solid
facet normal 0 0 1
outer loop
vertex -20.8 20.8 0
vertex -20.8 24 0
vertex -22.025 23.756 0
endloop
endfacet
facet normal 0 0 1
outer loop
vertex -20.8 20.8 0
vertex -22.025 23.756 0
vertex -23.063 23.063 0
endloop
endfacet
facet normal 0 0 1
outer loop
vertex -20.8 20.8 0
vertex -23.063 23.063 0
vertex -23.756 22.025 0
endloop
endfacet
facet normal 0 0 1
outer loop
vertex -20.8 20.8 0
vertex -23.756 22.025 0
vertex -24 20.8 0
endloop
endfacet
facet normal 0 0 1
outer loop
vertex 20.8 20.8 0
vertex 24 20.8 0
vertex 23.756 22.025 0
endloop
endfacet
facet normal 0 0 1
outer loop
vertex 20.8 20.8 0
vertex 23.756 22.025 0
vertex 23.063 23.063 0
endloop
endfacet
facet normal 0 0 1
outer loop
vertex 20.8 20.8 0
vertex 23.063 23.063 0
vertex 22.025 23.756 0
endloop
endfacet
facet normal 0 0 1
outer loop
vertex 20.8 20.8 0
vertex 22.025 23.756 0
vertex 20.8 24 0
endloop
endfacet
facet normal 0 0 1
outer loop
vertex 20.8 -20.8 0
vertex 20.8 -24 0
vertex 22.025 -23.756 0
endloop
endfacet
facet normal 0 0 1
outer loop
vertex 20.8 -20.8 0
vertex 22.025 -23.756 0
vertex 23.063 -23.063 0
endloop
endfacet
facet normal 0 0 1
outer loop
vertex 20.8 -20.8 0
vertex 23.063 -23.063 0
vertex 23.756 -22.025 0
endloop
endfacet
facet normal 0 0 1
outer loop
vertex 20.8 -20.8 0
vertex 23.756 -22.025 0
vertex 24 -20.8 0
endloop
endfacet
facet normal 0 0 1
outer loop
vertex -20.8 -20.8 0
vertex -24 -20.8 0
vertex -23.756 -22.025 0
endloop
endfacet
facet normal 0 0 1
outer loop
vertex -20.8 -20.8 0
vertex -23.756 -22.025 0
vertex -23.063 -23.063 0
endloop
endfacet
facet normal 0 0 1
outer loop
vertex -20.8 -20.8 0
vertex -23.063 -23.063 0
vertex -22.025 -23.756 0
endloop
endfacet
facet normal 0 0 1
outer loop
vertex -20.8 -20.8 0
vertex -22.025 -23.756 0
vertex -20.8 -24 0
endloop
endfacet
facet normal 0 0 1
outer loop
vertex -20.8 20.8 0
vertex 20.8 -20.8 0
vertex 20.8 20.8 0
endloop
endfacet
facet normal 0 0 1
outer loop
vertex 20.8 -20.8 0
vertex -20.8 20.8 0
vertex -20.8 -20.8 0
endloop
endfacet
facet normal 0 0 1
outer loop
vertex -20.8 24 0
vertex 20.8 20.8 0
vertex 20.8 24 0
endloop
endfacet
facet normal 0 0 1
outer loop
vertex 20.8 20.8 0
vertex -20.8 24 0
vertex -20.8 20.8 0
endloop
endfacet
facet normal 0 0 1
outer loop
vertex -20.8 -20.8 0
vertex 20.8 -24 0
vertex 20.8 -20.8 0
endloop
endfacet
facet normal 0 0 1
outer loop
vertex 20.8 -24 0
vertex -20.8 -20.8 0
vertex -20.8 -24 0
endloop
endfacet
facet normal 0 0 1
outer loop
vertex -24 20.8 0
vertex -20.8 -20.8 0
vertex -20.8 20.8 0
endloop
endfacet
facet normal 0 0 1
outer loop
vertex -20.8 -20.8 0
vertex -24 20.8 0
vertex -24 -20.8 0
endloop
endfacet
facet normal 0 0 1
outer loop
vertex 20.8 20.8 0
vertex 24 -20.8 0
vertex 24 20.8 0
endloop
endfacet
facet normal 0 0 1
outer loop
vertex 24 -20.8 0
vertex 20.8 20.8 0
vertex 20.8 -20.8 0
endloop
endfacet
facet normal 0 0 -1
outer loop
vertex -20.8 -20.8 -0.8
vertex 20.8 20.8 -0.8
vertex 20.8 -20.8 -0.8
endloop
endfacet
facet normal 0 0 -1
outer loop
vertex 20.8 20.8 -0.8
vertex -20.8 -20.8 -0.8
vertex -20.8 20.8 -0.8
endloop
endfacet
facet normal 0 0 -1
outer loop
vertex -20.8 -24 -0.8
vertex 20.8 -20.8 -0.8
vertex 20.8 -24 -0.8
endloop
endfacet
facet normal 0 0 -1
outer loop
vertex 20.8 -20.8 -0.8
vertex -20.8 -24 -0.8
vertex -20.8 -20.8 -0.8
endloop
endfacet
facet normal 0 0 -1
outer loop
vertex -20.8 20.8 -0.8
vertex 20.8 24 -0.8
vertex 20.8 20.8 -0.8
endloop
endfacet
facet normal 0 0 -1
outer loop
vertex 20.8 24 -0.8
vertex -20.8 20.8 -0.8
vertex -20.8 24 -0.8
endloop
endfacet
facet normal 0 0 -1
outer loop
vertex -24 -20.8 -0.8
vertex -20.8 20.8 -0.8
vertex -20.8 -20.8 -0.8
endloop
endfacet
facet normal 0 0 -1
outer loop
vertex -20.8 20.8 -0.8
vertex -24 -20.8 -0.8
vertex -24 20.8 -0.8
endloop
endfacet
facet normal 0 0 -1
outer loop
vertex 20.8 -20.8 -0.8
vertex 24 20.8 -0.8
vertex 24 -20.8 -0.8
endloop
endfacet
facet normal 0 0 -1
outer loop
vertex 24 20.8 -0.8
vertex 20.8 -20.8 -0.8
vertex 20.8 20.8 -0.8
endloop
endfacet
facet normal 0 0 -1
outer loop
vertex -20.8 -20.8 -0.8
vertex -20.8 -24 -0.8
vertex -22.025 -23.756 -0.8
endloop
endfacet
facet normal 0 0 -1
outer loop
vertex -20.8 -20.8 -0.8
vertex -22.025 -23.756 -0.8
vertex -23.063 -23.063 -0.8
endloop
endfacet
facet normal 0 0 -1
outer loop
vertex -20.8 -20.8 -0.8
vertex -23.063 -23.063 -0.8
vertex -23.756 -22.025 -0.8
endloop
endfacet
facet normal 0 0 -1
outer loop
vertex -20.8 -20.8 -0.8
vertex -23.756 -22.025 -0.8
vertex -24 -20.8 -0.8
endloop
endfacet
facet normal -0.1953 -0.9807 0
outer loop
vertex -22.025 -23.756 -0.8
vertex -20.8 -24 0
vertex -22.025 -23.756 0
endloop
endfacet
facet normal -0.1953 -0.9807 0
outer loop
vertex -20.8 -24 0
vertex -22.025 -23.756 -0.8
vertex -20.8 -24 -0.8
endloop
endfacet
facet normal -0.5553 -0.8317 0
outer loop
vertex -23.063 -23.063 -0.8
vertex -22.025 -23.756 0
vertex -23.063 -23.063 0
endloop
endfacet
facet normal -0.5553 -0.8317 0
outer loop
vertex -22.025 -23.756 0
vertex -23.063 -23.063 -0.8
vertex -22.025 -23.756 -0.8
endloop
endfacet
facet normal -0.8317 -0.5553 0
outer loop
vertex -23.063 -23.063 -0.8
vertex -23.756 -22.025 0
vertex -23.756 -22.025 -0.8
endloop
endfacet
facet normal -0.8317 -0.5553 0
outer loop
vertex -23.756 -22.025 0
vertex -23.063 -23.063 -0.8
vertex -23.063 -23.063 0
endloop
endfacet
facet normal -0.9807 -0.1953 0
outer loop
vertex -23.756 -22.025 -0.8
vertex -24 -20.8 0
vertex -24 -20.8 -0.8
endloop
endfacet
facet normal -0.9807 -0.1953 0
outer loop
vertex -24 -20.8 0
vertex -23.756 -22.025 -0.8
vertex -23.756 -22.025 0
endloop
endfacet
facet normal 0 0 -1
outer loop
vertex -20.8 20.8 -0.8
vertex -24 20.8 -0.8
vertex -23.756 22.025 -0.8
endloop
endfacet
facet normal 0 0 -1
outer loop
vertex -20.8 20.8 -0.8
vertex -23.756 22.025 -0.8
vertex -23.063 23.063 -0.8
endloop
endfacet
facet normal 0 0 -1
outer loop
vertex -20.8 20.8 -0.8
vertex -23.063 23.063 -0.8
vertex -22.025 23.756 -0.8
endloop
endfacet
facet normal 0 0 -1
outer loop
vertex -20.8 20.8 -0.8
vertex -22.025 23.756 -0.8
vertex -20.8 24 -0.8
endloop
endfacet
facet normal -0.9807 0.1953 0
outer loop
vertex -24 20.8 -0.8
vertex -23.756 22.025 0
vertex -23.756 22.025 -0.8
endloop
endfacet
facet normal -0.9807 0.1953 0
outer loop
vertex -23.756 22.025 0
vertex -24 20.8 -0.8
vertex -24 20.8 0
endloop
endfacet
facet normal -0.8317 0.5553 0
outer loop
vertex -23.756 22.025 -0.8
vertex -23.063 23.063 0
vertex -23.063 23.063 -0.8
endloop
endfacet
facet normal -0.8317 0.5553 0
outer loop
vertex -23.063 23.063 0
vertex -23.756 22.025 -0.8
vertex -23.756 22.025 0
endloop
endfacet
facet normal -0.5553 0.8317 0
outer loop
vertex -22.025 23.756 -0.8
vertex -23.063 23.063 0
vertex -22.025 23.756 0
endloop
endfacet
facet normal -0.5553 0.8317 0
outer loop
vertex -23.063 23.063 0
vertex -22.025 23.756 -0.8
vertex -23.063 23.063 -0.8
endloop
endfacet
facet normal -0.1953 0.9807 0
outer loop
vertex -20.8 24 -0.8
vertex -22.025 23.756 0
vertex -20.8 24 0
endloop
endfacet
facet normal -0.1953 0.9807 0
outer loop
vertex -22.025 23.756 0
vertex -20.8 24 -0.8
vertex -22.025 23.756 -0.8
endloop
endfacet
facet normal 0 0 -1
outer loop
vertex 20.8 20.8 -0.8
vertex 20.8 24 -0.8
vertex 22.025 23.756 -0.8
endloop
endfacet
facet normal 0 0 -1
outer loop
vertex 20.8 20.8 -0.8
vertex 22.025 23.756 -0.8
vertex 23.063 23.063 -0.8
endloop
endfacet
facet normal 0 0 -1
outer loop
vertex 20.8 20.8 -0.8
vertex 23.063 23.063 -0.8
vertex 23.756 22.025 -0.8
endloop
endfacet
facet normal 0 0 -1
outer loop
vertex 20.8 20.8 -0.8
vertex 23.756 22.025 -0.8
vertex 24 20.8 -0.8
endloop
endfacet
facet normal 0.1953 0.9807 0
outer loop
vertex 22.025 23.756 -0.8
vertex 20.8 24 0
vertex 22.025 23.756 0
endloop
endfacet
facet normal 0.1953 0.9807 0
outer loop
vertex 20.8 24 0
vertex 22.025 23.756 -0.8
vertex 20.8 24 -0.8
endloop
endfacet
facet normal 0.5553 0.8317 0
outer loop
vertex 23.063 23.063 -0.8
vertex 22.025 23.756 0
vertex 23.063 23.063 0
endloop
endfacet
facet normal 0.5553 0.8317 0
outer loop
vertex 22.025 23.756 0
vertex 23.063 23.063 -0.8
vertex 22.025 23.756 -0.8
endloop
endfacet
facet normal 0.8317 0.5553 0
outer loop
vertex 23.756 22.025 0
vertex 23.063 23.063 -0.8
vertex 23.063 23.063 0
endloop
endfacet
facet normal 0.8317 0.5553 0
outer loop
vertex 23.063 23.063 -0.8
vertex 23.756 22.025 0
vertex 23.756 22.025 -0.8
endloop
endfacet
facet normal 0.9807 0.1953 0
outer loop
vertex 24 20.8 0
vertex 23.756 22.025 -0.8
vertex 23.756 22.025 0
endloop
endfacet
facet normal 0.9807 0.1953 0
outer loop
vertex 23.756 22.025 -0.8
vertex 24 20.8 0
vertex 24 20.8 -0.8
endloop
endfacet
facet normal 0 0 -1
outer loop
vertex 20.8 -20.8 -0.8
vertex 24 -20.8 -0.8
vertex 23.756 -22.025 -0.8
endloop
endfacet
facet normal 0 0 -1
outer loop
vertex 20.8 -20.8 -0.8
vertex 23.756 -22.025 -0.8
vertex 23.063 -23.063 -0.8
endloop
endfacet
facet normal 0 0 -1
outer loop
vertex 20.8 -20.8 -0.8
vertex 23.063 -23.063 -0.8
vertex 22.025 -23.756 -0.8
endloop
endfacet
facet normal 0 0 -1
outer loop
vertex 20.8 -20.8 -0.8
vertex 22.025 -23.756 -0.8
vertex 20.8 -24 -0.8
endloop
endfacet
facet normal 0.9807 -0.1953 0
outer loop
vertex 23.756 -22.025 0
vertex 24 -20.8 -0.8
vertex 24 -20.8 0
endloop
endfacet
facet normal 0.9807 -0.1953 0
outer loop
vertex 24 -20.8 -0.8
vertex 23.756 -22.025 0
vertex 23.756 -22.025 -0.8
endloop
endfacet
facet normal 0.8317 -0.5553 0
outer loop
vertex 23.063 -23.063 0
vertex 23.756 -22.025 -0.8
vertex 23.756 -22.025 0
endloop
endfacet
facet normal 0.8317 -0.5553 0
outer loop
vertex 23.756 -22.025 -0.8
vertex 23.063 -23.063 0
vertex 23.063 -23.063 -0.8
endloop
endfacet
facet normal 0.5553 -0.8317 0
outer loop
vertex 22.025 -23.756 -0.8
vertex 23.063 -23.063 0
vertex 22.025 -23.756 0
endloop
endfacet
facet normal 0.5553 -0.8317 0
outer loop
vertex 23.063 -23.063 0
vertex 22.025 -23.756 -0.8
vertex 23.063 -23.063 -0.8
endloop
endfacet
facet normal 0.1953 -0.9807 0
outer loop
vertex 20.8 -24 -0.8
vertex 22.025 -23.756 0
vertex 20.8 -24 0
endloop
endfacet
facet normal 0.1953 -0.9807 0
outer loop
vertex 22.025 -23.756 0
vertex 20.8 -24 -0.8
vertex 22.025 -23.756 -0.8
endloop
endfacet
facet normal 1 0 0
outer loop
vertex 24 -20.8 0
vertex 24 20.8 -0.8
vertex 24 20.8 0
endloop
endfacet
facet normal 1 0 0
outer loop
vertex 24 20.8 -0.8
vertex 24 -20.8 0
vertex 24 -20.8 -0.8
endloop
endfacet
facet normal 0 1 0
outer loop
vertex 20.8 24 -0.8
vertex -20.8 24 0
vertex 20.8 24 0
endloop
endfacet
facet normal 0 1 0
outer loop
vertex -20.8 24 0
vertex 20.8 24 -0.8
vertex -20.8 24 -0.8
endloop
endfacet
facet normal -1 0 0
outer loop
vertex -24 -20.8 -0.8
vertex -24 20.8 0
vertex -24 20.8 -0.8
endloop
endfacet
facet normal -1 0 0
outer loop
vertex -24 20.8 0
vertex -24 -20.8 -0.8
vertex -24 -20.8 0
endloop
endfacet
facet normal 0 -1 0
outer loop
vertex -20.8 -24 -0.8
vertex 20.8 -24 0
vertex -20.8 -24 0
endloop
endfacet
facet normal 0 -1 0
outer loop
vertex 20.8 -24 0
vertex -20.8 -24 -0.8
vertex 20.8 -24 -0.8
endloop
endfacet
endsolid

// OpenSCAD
// file: ../p/1-4edge.scad
use <../lib.scad>
function ldraw_lib__1_4edge() = [
// 0 Circle 0.25
// 0 Name: 1-4edge.dat
// 0 Author: James Jessiman
// 0 !LDRAW_ORG Primitive UPDATE 2017-01
// 0 !LICENSE Licensed under CC BY 4.0 : see CAreadme.txt
// 
// 0 BFC CERTIFY CCW
  [0,"BFC","CERTIFY"],
  [0,"BFC","CCW"],
// 
// 0 !HISTORY 2007-06-22 [PTadmin] Header formatted for Contributor Agreement
// 0 !HISTORY 2008-07-01 [PTadmin] Official Update 2008-01
// 0 !HISTORY 2017-01-15 [Steffen] BFCed
// 0 !HISTORY 2017-12-30 [PTadmin] Official Update 2017-01
// 
// 
// 2 24 1 0 0 0.9239 0 0.3827
  [2,24,1,0,0,0.9239,0,0.3827],
// 2 24 0.9239 0 0.3827 0.7071 0 0.7071
  [2,24,0.9239,0,0.3827,0.7071,0,0.7071],
// 2 24 0.7071 0 0.7071 0.3827 0 0.9239
  [2,24,0.7071,0,0.7071,0.3827,0,0.9239],
// 2 24 0.3827 0 0.9239 0 0 1
  [2,24,0.3827,0,0.9239,0,0,1],
];
module ldraw_lib__1_4edge(step=0, col=false, unit=2/5, alt=false, line=0.2, solid=!$preview)
    makepoly(ldraw_lib__1_4edge(), step=step, col=col, unit=unit, alt=alt, line=line, solid=solid);
ldraw_lib__1_4edge(line=0.2);
// file: ../p/1-4cyli.scad
use <../lib.scad>
function ldraw_lib__1_4cyli() = [
// 0 Cylinder 0.25
// 0 Name: 1-4cyli.dat
// 0 Author: James Jessiman
// 0 !LDRAW_ORG Primitive UPDATE 2012-01
// 0 !LICENSE Licensed under CC BY 4.0 : see CAreadme.txt
// 
// 0 BFC CERTIFY CCW
  [0,"BFC","CERTIFY"],
  [0,"BFC","CCW"],
// 
// 0 !HISTORY 2002-03-23 [sbliss] Added BFC statement.
// 0 !HISTORY 2002-04-25 [PTadmin] Official Update 2002-02
// 0 !HISTORY 2007-06-22 [PTadmin] Header formatted for Contributor Agreement
// 0 !HISTORY 2008-07-01 [PTadmin] Official Update 2008-01
// 0 !HISTORY 2012-02-16 [Philo] Changed to CCW
// 0 !HISTORY 2012-03-30 [PTadmin] Official Update 2012-01
// 
// 
// 4 16 1 1 0 0.9239 1 0.3827 0.9239 0 0.3827 1 0 0
  [4,16,1,1,0,0.9239,1,0.3827,0.9239,0,0.3827,1,0,0],
// 5 24 1 0 0 1 1 0 0.9239 0 0.3827 1 0 -1
  [5,24,1,0,0,1,1,0,0.9239,0,0.3827,1,0,-1],
// 4 16 0.9239 1 0.3827 0.7071 1 0.7071 0.7071 0 0.7071 0.9239 0 0.3827
  [4,16,0.9239,1,0.3827,0.7071,1,0.7071,0.7071,0,0.7071,0.9239,0,0.3827],
// 5 24 0.9239 0 0.3827 0.9239 1 0.3827 0.7071 0 0.7071 1 0 0
  [5,24,0.9239,0,0.3827,0.9239,1,0.3827,0.7071,0,0.7071,1,0,0],
// 4 16 0.7071 1 0.7071 0.3827 1 0.9239 0.3827 0 0.9239 0.7071 0 0.7071
  [4,16,0.7071,1,0.7071,0.3827,1,0.9239,0.3827,0,0.9239,0.7071,0,0.7071],
// 5 24 0.7071 0 0.7071 0.7071 1 0.7071 0.3827 0 0.9239 0.9239 0 0.3827
  [5,24,0.7071,0,0.7071,0.7071,1,0.7071,0.3827,0,0.9239,0.9239,0,0.3827],
// 4 16 0.3827 1 0.9239 0 1 1 0 0 1 0.3827 0 0.9239
  [4,16,0.3827,1,0.9239,0,1,1,0,0,1,0.3827,0,0.9239],
// 5 24 0.3827 0 0.9239 0.3827 1 0.9239 0 0 1 0.7071 0 0.7071
  [5,24,0.3827,0,0.9239,0.3827,1,0.9239,0,0,1,0.7071,0,0.7071],
// 5 24 0 0 1 0 1 1 0.3827 0 0.9239 -1 0 1
  [5,24,0,0,1,0,1,1,0.3827,0,0.9239,-1,0,1],
];
module ldraw_lib__1_4cyli(step=0, col=false, unit=2/5, alt=false, line=0.2, solid=!$preview)
    makepoly(ldraw_lib__1_4cyli(), step=step, col=col, unit=unit, alt=alt, line=line, solid=solid);
ldraw_lib__1_4cyli(line=0.2);
// file: ../p/1-4disc.scad
use <../lib.scad>
function ldraw_lib__1_4disc() = [
// 0 Disc 0.25
// 0 Name: 1-4disc.dat
// 0 Author: James Jessiman
// 0 !LDRAW_ORG Primitive UPDATE 2002-02
// 0 !LICENSE Licensed under CC BY 4.0 : see CAreadme.txt
// 
// 0 BFC CERTIFY CCW
  [0,"BFC","CERTIFY"],
  [0,"BFC","CCW"],
// 
// 0 !HISTORY 2002-03-23 [sbliss] Added BFC statement.
// 0 !HISTORY 2002-04-25 [PTadmin] Official Update 2002-02
// 0 !HISTORY 2007-06-22 [PTadmin] Header formatted for Contributor Agreement
// 0 !HISTORY 2008-07-01 [PTadmin] Official Update 2008-01
// 
// 
// 3 16 0 0 0 1 0 0 0.9239 0 0.3827
  [3,16,0,0,0,1,0,0,0.9239,0,0.3827],
// 3 16 0 0 0 0.9239 0 0.3827 0.7071 0 0.7071
  [3,16,0,0,0,0.9239,0,0.3827,0.7071,0,0.7071],
// 3 16 0 0 0 0.7071 0 0.7071 0.3827 0 0.9239
  [3,16,0,0,0,0.7071,0,0.7071,0.3827,0,0.9239],
// 3 16 0 0 0 0.3827 0 0.9239 0 0 1
  [3,16,0,0,0,0.3827,0,0.9239,0,0,1],
// 0
];
module ldraw_lib__1_4disc(step=0, col=false, unit=2/5, alt=false, line=0.2, solid=!$preview)
    makepoly(ldraw_lib__1_4disc(), step=step, col=col, unit=unit, alt=alt, line=line, solid=solid);
ldraw_lib__1_4disc(line=0.2);
// file: ../p/1-4cylc.scad
use <../lib.scad>
use <1-4cyli.scad>
use <1-4disc.scad>
use <1-4edge.scad>
function ldraw_lib__1_4cylc() = [
// 0 Cylinder Closed 0.25
// 0 Name: 1-4cylc.dat
// 0 Author: Mark Kennedy [mkennedy]
// 0 !LDRAW_ORG Primitive UPDATE 2010-01
// 0 !LICENSE Licensed under CC BY 4.0 : see CAreadme.txt
// 
// 0 BFC CERTIFY CCW
  [0,"BFC","CERTIFY"],
  [0,"BFC","CCW"],
// 
// 0 !HISTORY 2010-04-05 [PTadmin] Official Update 2010-01
// 
// 
// 1 16 0 0 0 1 0 0 0 1 0 0 0 1 1-4edge.dat
  [1,16,0,0,0,1,0,0,0,1,0,0,0,1, ldraw_lib__1_4edge()],
// 1 16 0 1 0 1 0 0 0 1 0 0 0 1 1-4edge.dat
  [1,16,0,1,0,1,0,0,0,1,0,0,0,1, ldraw_lib__1_4edge()],
// 1 16 0 0 0 1 0 0 0 1 0 0 0 1 1-4disc.dat
  [1,16,0,0,0,1,0,0,0,1,0,0,0,1, ldraw_lib__1_4disc()],
// 1 16 0 0 0 1 0 0 0 1 0 0 0 1 1-4cyli.dat
  [1,16,0,0,0,1,0,0,0,1,0,0,0,1, ldraw_lib__1_4cyli()],
// 0
];
module ldraw_lib__1_4cylc(step=0, col=false, unit=2/5, alt=false, line=0.2, solid=!$preview)
    makepoly(ldraw_lib__1_4cylc(), step=step, col=col, unit=unit, alt=alt, line=line, solid=solid);
ldraw_lib__1_4cylc(line=0.2);
// main file
use <../lib.scad>
use <../p/1-4cylc.scad>
use <../p/1-4disc.scad>
function ldraw_lib__191765() = [
// 0 Cardboard  6 x  6 Thick with Rounded Corners with Silver Top
// 0 Name: 191765.dat
// 0 Author: Steffen [Steffen]
// 0 !LDRAW_ORG Part UPDATE 2020-02
// 0 !LICENSE Licensed under CC BY 4.0 : see CAreadme.txt
// 
// 0 !HELP For Plate 8 x 8 with Grille
// 
// 0 BFC CERTIFY CCW
  [0,"BFC","CERTIFY"],
  [0,"BFC","CCW"],
// 
// 0 !CATEGORY Sheet Cardboard
// 0 !KEYWORDS Scala, set 4336
// 
// 0 !HISTORY 2019-09-09 [PTadmin] Official Update 2019-02
// 0 !HISTORY 2020-07-06 [Steffen] adjusted title and !HELP
// 0 !HISTORY 2020-07-08 [PTadmin] Renamed from u9252p01
// 0 !HISTORY 2020-09-05 [PTadmin] Official Update 2020-02
// 
// 
// 1 383 -52 0 52 0 0 -8 0 1 0 8 0 0 1-4disc.dat
  [1,383,-52,0,52,0,0,-8,0,1,0,8,0,0, ldraw_lib__1_4disc()],
// 1 383 52 0 52 8 0 0 0 1 0 0 0 8 1-4disc.dat
  [1,383,52,0,52,8,0,0,0,1,0,0,0,8, ldraw_lib__1_4disc()],
// 1 383 52 0 -52 0 0 8 0 1 0 -8 0 0 1-4disc.dat
  [1,383,52,0,-52,0,0,8,0,1,0,-8,0,0, ldraw_lib__1_4disc()],
// 1 383 -52 0 -52 -8 0 0 0 1 0 0 0 -8 1-4disc.dat
  [1,383,-52,0,-52,-8,0,0,0,1,0,0,0,-8, ldraw_lib__1_4disc()],
// 4 383 -52 0 -52 52 0 -52 52 0 52 -52 0 52
  [4,383,-52,0,-52,52,0,-52,52,0,52,-52,0,52],
// 4 383 -52 0 52 52 0 52 52 0 60 -52 0 60
  [4,383,-52,0,52,52,0,52,52,0,60,-52,0,60],
// 4 383 -52 0 -60 52 0 -60 52 0 -52 -52 0 -52
  [4,383,-52,0,-60,52,0,-60,52,0,-52,-52,0,-52],
// 4 383 -52 0 -52 -52 0 52 -60 0 52 -60 0 -52
  [4,383,-52,0,-52,-52,0,52,-60,0,52,-60,0,-52],
// 4 383 60 0 -52 60 0 52 52 0 52 52 0 -52
  [4,383,60,0,-52,60,0,52,52,0,52,52,0,-52],
// 
// 4 16 -52 2 52 52 2 52 52 2 -52 -52 2 -52
  [4,16,-52,2,52,52,2,52,52,2,-52,-52,2,-52],
// 4 16 -52 2 -52 52 2 -52 52 2 -60 -52 2 -60
  [4,16,-52,2,-52,52,2,-52,52,2,-60,-52,2,-60],
// 4 16 -52 2 60 52 2 60 52 2 52 -52 2 52
  [4,16,-52,2,60,52,2,60,52,2,52,-52,2,52],
// 4 16 -52 2 52 -52 2 -52 -60 2 -52 -60 2 52
  [4,16,-52,2,52,-52,2,-52,-60,2,-52,-60,2,52],
// 4 16 60 2 52 60 2 -52 52 2 -52 52 2 52
  [4,16,60,2,52,60,2,-52,52,2,-52,52,2,52],
// 
// 1 16 -52 2 -52 0 0 -8 0 -2 0 -8 0 0 1-4cylc.dat
  [1,16,-52,2,-52,0,0,-8,0,-2,0,-8,0,0, ldraw_lib__1_4cylc()],
// 1 16 -52 2 52 -8 0 0 0 -2 0 0 0 8 1-4cylc.dat
  [1,16,-52,2,52,-8,0,0,0,-2,0,0,0,8, ldraw_lib__1_4cylc()],
// 1 16 52 2 52 0 0 8 0 -2 0 8 0 0 1-4cylc.dat
  [1,16,52,2,52,0,0,8,0,-2,0,8,0,0, ldraw_lib__1_4cylc()],
// 1 16 52 2 -52 8 0 0 0 -2 0 0 0 -8 1-4cylc.dat
  [1,16,52,2,-52,8,0,0,0,-2,0,0,0,-8, ldraw_lib__1_4cylc()],
// 
// 4 16 60 2 -52 60 2 52 60 0 52 60 0 -52
  [4,16,60,2,-52,60,2,52,60,0,52,60,0,-52],
// 4 16 52 2 60 -52 2 60 -52 0 60 52 0 60
  [4,16,52,2,60,-52,2,60,-52,0,60,52,0,60],
// 4 16 -60 2 52 -60 2 -52 -60 0 -52 -60 0 52
  [4,16,-60,2,52,-60,2,-52,-60,0,-52,-60,0,52],
// 4 16 -52 2 -60 52 2 -60 52 0 -60 -52 0 -60
  [4,16,-52,2,-60,52,2,-60,52,0,-60,-52,0,-60],
// 
// 2 24 -52 0 -60 52 0 -60
  [2,24,-52,0,-60,52,0,-60],
// 2 24 -52 2 -60 52 2 -60
  [2,24,-52,2,-60,52,2,-60],
// 2 24 60 0 -52 60 0 52
  [2,24,60,0,-52,60,0,52],
// 2 24 60 2 -52 60 2 52
  [2,24,60,2,-52,60,2,52],
// 2 24 52 0 60 -52 0 60
  [2,24,52,0,60,-52,0,60],
// 2 24 52 2 60 -52 2 60
  [2,24,52,2,60,-52,2,60],
// 2 24 -60 0 52 -60 0 -52
  [2,24,-60,0,52,-60,0,-52],
// 2 24 -60 2 52 -60 2 -52
  [2,24,-60,2,52,-60,2,-52],
];
module ldraw_lib__191765(step=0, col=false, unit=2/5, alt=false, line=0.2, solid=!$preview)
    makepoly(ldraw_lib__191765(), step=step, col=col, unit=unit, alt=alt, line=line, solid=solid);
ldraw_lib__191765(line=0.2);
